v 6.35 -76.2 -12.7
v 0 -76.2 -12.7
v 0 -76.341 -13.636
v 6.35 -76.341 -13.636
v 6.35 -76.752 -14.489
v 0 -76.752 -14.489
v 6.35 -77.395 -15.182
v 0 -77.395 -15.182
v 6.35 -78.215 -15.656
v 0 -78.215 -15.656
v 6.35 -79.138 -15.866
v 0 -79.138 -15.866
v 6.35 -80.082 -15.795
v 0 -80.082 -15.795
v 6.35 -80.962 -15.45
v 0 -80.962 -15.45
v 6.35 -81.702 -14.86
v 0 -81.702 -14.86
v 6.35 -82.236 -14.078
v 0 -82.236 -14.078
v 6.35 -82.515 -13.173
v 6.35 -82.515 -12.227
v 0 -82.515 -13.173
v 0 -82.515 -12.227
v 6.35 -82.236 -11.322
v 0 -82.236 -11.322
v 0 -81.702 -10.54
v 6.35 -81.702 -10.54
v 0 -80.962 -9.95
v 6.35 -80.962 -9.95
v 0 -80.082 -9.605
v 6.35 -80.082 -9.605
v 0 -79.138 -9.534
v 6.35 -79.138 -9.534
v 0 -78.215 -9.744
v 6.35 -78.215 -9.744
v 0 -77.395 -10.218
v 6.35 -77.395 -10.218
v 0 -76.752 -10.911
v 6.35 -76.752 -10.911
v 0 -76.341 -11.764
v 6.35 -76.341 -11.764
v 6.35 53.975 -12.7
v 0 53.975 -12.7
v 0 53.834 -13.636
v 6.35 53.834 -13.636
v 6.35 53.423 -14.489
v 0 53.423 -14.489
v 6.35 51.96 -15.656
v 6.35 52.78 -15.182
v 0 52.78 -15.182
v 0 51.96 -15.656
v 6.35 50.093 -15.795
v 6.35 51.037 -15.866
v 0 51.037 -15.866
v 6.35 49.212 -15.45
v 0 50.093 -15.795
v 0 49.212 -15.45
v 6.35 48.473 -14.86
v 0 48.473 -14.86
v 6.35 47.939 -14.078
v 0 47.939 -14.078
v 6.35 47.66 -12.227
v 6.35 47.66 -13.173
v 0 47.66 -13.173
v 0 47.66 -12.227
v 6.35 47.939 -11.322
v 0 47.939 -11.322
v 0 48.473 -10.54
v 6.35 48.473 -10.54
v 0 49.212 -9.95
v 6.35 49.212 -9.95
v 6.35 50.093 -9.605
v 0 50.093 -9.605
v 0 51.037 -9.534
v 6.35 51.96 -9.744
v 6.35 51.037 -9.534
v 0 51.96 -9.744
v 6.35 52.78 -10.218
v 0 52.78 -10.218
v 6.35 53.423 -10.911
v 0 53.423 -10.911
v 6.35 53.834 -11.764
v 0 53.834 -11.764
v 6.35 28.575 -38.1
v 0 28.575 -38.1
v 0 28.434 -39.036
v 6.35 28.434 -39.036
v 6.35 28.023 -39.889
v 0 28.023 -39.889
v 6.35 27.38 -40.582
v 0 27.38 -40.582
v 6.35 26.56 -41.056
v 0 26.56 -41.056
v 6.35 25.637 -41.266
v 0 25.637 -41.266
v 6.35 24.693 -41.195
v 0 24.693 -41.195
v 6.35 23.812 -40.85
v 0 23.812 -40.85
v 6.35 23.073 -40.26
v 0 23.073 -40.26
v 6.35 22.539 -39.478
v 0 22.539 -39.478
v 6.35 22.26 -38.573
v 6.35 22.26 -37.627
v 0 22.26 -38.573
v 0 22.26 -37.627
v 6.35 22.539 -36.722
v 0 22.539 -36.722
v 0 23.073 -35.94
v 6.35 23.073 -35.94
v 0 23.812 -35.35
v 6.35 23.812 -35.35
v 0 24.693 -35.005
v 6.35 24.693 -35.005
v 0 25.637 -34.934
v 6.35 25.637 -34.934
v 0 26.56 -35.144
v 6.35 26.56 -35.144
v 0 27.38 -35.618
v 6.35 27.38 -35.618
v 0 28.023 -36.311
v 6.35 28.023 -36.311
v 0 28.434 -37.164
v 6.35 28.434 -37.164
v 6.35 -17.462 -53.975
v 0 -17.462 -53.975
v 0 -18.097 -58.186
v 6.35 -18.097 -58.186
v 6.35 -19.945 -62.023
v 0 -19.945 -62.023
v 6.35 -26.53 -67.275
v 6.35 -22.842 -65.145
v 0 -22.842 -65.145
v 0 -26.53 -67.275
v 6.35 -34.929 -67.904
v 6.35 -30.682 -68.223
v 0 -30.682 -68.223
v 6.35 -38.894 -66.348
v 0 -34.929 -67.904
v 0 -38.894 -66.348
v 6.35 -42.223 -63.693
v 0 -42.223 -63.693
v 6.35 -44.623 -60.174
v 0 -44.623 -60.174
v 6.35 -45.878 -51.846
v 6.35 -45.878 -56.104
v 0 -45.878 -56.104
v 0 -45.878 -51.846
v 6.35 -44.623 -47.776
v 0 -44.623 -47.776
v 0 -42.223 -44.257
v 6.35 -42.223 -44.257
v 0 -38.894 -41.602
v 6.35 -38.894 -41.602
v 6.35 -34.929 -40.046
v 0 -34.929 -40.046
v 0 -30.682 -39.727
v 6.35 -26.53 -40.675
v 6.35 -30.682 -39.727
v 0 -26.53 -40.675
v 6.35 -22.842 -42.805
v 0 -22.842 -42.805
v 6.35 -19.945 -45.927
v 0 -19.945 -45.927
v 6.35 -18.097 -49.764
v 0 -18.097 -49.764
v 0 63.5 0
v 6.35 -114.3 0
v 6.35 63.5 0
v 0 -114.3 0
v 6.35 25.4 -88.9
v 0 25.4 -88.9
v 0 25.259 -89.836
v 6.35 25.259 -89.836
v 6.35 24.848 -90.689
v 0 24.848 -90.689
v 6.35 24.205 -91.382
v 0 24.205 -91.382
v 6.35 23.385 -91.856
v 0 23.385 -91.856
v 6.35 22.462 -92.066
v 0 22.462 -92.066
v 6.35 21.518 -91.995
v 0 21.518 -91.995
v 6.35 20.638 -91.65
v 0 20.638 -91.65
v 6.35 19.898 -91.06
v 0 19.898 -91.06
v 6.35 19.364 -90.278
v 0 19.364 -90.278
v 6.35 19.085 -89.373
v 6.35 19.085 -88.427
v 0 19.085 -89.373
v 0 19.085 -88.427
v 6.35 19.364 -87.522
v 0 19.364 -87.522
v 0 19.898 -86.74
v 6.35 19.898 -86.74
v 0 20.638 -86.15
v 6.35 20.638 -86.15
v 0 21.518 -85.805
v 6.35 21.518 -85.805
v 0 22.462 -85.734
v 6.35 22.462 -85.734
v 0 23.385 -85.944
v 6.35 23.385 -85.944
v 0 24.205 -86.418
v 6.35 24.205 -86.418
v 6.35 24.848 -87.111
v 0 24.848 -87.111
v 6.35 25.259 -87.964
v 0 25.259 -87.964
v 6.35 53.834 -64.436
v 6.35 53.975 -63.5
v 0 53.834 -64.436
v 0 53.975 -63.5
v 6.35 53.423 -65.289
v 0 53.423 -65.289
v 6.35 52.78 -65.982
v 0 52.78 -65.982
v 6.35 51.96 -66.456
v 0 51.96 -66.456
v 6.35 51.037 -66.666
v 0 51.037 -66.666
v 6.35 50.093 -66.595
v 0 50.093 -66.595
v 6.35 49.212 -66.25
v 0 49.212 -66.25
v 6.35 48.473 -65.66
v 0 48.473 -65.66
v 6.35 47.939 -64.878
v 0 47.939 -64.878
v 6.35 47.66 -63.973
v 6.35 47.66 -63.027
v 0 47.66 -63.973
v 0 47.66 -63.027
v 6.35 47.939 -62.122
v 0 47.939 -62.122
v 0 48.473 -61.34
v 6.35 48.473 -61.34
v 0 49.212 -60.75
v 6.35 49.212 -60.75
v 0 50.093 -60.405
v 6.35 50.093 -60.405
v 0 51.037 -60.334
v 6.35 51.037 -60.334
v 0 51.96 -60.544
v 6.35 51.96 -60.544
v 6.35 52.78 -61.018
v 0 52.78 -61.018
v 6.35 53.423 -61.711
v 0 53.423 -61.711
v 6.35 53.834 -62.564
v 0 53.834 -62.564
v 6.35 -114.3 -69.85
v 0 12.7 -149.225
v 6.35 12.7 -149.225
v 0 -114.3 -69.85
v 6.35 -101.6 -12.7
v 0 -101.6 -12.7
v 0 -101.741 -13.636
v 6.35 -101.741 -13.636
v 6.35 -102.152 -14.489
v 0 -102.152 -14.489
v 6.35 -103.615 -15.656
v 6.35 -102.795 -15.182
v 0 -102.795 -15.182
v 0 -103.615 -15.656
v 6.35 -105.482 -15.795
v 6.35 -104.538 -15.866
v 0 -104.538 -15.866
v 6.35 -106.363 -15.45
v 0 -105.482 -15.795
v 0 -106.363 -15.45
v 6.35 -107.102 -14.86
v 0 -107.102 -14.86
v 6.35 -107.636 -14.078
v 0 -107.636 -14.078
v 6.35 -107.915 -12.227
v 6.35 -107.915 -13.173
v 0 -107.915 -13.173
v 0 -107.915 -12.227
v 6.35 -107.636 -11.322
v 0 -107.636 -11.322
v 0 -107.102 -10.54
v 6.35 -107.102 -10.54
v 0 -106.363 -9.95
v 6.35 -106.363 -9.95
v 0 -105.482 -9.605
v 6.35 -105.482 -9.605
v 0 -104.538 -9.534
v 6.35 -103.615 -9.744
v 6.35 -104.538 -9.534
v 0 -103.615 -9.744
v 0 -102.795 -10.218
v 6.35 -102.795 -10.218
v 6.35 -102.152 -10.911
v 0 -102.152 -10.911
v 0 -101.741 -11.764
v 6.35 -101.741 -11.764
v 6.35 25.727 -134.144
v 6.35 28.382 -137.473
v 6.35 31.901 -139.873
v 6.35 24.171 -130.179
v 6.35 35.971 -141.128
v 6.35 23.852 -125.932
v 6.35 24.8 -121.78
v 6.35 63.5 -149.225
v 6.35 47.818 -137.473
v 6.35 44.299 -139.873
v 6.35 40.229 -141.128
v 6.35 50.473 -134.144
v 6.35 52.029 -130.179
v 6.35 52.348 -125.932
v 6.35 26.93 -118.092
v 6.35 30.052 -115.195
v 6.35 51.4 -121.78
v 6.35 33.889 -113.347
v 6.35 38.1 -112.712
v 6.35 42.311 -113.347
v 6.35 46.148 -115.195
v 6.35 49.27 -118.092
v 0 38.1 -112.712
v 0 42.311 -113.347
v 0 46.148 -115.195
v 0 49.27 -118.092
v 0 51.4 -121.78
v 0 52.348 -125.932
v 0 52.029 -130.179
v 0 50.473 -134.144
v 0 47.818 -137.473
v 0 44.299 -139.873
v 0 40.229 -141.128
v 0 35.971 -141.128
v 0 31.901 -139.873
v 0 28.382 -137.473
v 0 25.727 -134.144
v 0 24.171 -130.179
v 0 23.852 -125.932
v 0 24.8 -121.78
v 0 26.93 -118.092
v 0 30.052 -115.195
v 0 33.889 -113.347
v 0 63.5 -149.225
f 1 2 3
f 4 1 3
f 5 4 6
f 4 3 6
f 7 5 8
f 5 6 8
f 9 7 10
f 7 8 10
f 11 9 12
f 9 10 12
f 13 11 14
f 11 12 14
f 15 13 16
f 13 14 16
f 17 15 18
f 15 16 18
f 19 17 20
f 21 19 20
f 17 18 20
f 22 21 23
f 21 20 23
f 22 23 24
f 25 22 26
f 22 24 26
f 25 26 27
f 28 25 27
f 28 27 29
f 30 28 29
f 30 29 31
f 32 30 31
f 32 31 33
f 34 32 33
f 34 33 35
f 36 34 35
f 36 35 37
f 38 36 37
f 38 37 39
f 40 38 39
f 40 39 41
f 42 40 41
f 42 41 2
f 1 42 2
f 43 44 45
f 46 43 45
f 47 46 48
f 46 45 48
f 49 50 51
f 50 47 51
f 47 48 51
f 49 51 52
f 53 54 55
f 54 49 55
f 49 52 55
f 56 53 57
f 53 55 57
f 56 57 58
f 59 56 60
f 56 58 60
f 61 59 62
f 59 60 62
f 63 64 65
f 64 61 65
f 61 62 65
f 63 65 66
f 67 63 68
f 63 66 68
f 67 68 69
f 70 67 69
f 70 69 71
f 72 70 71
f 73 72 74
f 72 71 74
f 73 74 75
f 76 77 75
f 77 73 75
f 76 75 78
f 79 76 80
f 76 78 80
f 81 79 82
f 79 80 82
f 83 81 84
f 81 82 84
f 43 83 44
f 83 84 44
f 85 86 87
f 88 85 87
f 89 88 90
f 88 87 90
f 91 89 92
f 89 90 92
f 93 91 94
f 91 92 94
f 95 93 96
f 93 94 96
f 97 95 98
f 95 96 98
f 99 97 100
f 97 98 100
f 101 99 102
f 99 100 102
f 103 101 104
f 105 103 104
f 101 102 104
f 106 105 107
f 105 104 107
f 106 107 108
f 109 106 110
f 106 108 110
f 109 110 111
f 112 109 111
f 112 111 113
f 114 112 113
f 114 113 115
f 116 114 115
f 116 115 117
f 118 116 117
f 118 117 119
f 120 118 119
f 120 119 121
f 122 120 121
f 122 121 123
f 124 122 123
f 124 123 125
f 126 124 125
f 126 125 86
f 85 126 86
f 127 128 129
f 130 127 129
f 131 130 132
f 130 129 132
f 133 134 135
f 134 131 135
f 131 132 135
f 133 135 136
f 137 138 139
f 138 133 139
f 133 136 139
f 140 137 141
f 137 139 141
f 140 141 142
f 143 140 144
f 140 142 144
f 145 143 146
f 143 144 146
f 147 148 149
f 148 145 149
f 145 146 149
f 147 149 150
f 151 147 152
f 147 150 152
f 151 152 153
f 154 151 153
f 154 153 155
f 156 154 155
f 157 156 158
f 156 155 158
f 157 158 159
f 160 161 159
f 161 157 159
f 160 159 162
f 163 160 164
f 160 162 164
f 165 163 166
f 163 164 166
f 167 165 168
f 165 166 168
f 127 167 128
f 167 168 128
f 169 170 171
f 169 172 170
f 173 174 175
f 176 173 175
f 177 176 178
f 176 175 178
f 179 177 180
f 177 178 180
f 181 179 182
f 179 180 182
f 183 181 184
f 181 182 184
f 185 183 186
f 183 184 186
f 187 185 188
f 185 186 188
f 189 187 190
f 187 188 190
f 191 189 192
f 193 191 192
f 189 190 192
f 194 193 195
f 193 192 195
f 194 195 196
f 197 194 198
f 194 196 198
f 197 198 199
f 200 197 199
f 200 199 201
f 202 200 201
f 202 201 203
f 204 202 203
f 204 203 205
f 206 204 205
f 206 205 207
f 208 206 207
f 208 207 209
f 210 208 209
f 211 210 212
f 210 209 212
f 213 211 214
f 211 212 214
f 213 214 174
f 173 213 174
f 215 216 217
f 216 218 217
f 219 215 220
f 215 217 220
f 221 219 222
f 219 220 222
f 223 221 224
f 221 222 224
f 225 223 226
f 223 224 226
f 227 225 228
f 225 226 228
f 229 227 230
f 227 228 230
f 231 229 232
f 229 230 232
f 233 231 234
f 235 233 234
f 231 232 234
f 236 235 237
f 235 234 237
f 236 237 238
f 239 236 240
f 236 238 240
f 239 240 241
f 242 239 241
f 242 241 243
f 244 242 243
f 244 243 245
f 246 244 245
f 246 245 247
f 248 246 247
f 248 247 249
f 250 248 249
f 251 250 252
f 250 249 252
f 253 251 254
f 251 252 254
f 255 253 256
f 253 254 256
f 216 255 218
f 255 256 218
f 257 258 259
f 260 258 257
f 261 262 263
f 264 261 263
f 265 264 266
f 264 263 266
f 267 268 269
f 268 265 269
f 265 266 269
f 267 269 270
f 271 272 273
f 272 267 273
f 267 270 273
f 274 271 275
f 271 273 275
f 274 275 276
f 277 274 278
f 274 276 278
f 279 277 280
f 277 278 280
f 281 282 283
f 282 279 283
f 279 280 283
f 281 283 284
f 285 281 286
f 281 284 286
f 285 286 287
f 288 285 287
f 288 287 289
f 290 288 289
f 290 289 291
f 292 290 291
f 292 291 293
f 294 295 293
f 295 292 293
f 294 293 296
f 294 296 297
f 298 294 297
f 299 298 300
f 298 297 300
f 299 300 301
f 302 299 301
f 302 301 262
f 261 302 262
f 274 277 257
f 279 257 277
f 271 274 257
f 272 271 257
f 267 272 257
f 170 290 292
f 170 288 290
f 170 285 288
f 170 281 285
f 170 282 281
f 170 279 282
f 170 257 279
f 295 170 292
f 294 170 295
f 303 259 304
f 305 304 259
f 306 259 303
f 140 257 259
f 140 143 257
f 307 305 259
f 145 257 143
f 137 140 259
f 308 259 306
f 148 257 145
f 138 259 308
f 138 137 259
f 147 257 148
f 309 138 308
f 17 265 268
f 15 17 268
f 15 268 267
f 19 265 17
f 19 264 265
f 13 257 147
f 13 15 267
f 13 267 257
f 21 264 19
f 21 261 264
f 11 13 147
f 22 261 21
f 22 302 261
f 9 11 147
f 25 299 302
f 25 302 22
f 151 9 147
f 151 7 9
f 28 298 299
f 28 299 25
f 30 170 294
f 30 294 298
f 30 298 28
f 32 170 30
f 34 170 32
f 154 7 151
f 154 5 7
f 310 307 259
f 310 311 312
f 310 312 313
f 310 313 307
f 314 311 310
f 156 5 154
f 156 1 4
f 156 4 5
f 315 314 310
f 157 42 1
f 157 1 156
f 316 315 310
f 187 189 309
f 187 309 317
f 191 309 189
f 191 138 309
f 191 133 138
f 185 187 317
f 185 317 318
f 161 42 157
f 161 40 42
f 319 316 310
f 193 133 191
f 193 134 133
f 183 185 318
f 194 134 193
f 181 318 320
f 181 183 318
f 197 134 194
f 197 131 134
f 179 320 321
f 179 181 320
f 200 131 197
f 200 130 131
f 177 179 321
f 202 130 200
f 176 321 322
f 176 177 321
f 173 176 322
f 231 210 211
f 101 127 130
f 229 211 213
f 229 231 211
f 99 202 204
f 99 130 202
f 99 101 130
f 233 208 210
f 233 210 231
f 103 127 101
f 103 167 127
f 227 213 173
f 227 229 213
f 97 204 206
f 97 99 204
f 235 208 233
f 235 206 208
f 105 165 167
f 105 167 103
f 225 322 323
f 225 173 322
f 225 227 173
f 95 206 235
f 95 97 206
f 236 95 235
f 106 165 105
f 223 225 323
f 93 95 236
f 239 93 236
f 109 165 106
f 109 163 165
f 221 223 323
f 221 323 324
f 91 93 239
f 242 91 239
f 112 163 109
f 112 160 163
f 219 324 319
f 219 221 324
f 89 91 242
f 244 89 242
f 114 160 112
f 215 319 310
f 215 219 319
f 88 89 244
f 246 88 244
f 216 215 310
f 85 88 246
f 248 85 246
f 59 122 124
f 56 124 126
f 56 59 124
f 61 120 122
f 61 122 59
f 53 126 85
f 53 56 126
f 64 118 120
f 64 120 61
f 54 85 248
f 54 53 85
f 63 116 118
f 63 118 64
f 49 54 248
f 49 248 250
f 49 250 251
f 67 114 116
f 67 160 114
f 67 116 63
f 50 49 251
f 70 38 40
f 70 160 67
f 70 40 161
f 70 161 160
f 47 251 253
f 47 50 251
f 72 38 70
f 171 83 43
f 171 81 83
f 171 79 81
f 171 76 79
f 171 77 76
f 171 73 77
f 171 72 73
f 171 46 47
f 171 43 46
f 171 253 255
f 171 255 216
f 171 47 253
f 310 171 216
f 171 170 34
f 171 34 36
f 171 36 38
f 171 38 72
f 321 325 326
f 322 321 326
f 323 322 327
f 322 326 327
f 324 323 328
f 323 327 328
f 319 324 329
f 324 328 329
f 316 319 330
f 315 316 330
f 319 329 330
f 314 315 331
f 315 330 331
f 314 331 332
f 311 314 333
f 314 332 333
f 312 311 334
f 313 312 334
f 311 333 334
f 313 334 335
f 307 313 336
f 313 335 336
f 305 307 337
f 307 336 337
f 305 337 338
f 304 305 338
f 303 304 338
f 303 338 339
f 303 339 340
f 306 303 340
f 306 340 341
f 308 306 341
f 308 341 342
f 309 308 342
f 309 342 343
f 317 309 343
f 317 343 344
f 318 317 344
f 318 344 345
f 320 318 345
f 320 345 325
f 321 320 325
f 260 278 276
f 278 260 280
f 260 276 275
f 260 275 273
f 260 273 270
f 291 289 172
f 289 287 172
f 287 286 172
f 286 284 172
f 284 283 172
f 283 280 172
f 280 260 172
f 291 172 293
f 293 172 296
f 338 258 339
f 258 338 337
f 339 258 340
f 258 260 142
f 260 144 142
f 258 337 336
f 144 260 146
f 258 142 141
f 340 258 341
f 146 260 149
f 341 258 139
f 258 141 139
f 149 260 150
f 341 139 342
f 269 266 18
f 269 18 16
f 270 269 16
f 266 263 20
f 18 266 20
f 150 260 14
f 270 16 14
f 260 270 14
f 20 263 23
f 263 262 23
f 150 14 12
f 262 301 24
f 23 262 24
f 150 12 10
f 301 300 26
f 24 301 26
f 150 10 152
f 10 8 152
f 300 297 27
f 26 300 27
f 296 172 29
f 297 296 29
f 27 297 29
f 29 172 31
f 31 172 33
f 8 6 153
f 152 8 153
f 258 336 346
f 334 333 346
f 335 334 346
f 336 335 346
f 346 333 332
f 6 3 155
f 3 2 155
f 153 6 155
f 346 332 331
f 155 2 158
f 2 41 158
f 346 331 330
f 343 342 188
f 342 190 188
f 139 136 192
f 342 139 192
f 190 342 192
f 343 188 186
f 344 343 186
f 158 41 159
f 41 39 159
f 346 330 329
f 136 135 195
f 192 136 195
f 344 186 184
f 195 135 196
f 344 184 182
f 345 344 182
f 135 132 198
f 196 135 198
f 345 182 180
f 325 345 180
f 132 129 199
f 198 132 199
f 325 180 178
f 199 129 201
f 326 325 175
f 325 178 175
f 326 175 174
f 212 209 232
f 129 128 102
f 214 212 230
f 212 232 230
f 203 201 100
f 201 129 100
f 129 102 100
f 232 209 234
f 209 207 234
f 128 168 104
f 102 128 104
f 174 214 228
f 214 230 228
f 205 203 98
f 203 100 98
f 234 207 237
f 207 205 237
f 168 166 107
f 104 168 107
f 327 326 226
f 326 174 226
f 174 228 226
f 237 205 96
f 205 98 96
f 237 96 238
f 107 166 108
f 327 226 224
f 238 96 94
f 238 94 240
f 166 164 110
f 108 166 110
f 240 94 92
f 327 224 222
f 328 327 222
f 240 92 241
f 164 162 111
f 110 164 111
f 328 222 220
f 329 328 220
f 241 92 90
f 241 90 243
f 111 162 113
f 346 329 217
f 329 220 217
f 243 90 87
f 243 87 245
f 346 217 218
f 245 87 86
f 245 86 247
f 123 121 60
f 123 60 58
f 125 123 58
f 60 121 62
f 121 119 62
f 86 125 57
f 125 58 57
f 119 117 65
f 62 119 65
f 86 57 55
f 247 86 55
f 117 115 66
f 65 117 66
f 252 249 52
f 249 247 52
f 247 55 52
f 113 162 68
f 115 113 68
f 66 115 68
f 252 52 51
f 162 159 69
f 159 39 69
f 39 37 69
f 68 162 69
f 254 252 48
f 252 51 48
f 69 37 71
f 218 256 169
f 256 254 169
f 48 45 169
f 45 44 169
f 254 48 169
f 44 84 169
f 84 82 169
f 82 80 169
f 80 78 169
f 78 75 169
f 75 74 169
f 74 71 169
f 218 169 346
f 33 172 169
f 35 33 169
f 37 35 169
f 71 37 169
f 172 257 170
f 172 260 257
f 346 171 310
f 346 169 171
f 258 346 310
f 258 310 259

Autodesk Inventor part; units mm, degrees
ref_plane "YZ Plane" through (0, 0, 0) normal (1, 0, 0) x (0, 1, 0)
ref_plane "XZ Plane" through (0, 0, 0) normal (0, 1, 0) x (-1, 0, 0)
ref_plane "XY Plane" through (0, 0, 0) normal (0, 0, 1) x (1, 0, 0)
sketch "Sketch1" plane through (0, 0, 0) normal (1, 0, 0) x (0, 1, 0)
  line L0 (0, 0) -> (63.5, 0)
  line L1 (63.5, 0) -> (63.5, -149.225)
  line L2 (63.5, -149.225) -> (12.7, -149.225)
  circle A0 centre (-31.75, -53.975) radius 14.2875
  line L3 (63.5, -25.4) -> (-43.502, -25.4) construction
  circle A1 centre (50.8, -12.7) radius 3.175
  circle A2 centre (-104.775, -12.7) radius 3.175
  line L4 (12.7, -149.225) -> (-114.3, -69.85)
  line L5 (-114.3, -69.85) -> (-114.3, 0)
  line L6 (-114.3, 0) -> (0, 0)
  circle A3 centre (-85.725, -53.975) radius 14.2875
  line L7 (-53.2384, 0) -> (-95.25, 0)
  circle A4 centre (-79.375, -12.7) radius 3.175
  circle A5 centre (25.4, -38.1) radius 3.175
  circle A6 centre (50.8, -63.5) radius 3.175
  circle A7 centre (22.225, -88.9) radius 3.175
  dimension "d1" = 28.575
  dimension "d2" = 63.5
  dimension "d6" = 25.4
  dimension "d7" = 6.35
  dimension "d8" = 6.35
  dimension "d9" = 12.7
  dimension "d10" = 12.7
  dimension "d12" = 12.7
  dimension "d17" = 50.8
  dimension "d18" = 114.3
  dimension "d19" = 9.525
  dimension "d20" = 53.975
  dimension "d21" = 28.575
  dimension "d24" = 53.975
  dimension "d25" = 69.85
  dimension "d26" = 53.975
  dimension "d27" = 149.225
  dimension "d28" = 107.002
  dimension "d45" = 6.35
  dimension "d46" = 12.7
  dimension "d47" = 25.4
  dimension "d48" = 6.35
  dimension "d49" = 38.1
  dimension "d50" = 38.1
  dimension "d53" = 6.35
  dimension "d54" = 6.35
  dimension "d55" = 41.275
  dimension "d56" = 88.9
  dimension "d57" = 12.7
  dimension "d58" = 63.5
extrude "Extrusion1" add sketch "Sketch1" along normal blind 6.35 contours L0 L1 L2 L4 L5 L6 | A3 | A4 | A5 | A6 | A7
sketch "Sketch2" plane through (0, 0, 0) normal (-1, 0, 0) x (0, 0, 1)
  circle A0 centre (-127, 38.1) radius 14.2875
  line L0 (-149.225, 63.5) -> (-149.225, 12.7) projected
  line L1 (0, 63.5) -> (-149.225, 63.5) projected
  point P0 (0, 0)
  dimension "d40" = 28.575
  dimension "d41" = 22.225
  dimension "d42" = 25.4
extrude "Extrusion3" cut sketch "Sketch2" against normal blind 25.4
extrude "Extrusion4" cut sketch "Sketch1" along normal blind 25.4 contours A4 | A5 | A6 | A7
equation "\"BendRadius\" = Thickness"
equation "\"BendReliefWidth\" = Thickness"
equation "\"BendReliefDepth\" = 0.5 * Thickness"
equation "\"CornerReliefSize\" = 4 * Thickness"
equation "\"MinimumRemnant\" = 2 * Thickness"
equation "\"TransitionRadius\" = BendRadius"
equation "\"JacobiRadiusSize\" = Thickness"
equation "\"GapSize\" = Thickness"
equation "\"Thickness\" = 3.048"
properties part number "15102898-16-P-0310" material "Aluminum 6061"
